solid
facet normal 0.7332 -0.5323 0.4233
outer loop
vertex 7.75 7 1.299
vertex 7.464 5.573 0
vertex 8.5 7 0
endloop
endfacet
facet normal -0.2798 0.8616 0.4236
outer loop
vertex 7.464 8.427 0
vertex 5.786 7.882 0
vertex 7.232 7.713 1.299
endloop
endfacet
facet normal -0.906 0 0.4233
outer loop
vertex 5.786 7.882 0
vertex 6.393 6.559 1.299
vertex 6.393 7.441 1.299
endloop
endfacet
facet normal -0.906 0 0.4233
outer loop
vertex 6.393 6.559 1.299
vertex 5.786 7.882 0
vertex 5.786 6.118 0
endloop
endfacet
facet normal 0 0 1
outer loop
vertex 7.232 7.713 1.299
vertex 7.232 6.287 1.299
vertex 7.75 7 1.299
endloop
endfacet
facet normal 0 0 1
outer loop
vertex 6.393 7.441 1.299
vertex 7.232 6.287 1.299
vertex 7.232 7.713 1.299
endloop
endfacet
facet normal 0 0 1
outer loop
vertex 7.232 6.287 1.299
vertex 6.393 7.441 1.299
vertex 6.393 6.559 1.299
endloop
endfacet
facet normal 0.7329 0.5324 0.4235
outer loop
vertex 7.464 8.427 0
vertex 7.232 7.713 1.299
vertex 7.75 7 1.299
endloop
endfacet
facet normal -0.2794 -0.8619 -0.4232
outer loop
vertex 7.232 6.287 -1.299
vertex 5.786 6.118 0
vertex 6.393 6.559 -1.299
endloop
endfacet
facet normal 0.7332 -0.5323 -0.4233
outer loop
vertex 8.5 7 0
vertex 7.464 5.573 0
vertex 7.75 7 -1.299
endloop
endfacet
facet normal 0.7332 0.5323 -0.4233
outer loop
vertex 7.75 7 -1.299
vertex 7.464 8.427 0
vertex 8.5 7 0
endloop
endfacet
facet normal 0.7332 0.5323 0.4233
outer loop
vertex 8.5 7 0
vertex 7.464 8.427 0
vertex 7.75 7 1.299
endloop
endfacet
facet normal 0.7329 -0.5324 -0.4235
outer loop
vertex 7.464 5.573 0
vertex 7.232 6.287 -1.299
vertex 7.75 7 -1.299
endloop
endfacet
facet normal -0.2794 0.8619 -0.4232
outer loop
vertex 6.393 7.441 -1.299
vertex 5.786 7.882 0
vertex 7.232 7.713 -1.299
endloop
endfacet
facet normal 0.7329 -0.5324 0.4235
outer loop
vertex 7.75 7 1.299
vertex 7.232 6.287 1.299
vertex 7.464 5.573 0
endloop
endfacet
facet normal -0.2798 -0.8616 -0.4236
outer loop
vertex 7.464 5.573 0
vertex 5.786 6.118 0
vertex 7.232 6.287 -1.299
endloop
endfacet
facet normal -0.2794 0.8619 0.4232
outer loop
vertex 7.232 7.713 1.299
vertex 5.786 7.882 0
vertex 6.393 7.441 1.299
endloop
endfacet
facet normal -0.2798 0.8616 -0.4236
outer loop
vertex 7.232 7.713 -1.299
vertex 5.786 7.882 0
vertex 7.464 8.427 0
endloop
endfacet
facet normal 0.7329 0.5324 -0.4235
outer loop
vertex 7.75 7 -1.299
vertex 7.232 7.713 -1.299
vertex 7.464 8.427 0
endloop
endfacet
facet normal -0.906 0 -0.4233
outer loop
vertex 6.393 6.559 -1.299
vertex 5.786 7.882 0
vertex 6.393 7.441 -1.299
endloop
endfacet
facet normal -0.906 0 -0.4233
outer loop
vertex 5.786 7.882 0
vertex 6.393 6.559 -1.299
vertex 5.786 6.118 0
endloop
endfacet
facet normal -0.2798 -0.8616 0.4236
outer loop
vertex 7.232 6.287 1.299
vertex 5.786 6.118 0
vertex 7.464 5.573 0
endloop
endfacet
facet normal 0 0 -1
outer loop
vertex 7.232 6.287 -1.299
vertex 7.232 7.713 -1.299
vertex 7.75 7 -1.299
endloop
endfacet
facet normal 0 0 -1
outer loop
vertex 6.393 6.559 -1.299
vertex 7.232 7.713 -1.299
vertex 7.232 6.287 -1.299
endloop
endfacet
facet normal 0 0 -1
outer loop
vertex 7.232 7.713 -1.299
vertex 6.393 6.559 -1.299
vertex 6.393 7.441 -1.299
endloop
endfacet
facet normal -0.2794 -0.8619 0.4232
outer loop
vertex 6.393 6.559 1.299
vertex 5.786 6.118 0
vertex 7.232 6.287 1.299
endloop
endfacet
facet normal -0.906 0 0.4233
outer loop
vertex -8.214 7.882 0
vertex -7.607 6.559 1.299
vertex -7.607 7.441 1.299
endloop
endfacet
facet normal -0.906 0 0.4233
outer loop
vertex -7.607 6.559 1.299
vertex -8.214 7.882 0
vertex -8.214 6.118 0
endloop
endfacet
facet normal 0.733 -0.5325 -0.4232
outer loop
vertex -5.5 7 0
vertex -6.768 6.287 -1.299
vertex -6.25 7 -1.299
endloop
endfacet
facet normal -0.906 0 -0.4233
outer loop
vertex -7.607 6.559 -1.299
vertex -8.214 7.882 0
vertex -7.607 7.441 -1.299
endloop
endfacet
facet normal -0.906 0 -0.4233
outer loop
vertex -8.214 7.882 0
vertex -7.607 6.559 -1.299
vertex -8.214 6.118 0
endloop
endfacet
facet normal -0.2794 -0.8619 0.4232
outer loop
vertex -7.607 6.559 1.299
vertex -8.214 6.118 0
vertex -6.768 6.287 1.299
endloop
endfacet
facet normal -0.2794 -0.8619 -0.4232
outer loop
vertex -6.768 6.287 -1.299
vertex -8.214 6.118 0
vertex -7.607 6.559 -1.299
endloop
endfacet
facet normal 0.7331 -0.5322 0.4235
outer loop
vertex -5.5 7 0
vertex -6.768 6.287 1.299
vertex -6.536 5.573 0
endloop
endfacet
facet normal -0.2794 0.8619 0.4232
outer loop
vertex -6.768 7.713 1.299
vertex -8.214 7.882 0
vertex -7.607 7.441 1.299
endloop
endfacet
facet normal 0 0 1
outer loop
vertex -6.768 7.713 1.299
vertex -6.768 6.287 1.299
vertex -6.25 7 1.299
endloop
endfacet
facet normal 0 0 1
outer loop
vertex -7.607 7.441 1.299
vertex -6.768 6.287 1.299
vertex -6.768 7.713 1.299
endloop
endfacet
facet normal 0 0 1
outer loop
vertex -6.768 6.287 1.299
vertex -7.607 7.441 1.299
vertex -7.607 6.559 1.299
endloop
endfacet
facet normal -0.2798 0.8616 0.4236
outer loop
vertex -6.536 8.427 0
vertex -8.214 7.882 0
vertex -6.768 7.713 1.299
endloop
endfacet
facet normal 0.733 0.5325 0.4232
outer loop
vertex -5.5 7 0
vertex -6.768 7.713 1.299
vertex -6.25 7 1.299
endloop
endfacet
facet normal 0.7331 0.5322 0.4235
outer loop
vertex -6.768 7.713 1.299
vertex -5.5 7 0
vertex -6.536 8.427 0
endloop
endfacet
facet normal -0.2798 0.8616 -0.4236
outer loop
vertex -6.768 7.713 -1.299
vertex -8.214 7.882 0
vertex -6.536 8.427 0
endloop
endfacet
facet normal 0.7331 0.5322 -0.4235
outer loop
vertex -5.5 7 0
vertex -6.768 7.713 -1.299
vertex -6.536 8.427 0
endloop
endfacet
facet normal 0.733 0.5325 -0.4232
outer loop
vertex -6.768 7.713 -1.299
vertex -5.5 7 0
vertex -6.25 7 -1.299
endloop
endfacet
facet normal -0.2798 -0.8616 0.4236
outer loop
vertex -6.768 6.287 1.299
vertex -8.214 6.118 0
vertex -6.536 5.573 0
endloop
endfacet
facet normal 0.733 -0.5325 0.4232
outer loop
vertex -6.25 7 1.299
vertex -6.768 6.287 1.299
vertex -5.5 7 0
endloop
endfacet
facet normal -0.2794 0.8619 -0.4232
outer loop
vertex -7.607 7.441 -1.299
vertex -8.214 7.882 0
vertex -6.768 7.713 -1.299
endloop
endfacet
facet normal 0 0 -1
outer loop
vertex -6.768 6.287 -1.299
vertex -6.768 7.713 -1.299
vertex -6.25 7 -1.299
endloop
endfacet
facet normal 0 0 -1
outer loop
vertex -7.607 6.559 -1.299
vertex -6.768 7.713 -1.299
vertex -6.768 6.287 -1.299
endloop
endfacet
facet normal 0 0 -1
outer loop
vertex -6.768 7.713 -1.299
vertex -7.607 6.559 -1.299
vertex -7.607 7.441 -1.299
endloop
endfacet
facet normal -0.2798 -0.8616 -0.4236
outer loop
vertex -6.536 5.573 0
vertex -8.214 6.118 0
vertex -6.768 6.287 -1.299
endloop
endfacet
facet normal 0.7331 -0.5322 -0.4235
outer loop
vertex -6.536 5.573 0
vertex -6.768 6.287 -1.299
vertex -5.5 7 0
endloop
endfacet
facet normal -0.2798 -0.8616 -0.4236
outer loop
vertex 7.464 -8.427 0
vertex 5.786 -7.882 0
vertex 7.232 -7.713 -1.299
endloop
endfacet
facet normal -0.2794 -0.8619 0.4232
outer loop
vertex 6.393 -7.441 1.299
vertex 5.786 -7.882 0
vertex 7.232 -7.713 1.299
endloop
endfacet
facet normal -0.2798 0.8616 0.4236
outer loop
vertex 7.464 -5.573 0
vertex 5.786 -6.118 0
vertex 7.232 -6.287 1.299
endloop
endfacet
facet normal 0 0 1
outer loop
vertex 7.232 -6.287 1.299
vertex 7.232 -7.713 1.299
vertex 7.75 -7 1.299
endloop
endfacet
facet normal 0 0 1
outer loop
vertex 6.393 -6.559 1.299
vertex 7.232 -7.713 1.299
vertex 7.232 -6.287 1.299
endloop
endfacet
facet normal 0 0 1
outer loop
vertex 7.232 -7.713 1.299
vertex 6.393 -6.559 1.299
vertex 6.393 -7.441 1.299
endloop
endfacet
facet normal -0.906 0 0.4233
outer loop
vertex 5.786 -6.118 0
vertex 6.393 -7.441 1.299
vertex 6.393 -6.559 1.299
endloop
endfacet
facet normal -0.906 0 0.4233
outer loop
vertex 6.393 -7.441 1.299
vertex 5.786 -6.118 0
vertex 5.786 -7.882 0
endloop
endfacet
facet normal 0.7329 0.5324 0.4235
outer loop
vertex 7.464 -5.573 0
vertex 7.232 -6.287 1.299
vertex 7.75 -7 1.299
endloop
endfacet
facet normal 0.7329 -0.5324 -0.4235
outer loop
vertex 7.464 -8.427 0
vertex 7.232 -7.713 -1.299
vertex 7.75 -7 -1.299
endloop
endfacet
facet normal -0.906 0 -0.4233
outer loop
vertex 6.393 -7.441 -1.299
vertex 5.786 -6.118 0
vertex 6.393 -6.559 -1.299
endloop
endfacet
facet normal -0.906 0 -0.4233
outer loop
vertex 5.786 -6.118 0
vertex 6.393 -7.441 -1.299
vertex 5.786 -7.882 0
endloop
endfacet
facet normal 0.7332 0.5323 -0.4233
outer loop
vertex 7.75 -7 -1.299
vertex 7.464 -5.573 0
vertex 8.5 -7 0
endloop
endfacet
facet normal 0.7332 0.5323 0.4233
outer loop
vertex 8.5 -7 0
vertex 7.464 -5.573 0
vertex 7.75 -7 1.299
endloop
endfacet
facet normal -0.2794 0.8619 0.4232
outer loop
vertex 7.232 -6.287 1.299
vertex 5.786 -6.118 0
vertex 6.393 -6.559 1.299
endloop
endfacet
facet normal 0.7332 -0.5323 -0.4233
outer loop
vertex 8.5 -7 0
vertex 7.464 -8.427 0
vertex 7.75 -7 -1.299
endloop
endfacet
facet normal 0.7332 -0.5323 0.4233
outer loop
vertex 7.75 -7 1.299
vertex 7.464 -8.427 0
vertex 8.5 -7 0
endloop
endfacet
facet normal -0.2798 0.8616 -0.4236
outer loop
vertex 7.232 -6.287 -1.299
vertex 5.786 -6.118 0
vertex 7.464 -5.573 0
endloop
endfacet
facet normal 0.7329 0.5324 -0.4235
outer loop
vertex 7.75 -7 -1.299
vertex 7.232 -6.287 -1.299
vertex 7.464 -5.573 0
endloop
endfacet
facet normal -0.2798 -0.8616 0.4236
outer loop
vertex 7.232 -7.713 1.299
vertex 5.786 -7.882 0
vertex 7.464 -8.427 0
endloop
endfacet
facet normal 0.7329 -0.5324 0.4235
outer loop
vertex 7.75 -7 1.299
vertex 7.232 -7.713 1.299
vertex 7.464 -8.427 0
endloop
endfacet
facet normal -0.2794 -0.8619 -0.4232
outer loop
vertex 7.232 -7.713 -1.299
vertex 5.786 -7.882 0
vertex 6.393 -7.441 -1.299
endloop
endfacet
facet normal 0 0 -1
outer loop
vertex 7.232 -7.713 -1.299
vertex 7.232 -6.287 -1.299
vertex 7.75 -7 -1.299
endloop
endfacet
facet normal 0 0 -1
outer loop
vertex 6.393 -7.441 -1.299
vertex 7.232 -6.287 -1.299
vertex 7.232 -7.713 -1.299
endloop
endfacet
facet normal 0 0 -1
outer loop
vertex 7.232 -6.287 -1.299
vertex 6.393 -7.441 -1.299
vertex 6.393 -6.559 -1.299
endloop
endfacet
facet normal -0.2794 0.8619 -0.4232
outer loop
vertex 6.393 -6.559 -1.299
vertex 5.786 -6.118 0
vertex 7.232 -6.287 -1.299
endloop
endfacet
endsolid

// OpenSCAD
union() {
  translate([7, 7, 0]) sphere(r=1.5);
  translate([-7, 7, 0]) sphere(r=1.5);
  translate([7, -7, 0]) sphere(r=1.5);
}
